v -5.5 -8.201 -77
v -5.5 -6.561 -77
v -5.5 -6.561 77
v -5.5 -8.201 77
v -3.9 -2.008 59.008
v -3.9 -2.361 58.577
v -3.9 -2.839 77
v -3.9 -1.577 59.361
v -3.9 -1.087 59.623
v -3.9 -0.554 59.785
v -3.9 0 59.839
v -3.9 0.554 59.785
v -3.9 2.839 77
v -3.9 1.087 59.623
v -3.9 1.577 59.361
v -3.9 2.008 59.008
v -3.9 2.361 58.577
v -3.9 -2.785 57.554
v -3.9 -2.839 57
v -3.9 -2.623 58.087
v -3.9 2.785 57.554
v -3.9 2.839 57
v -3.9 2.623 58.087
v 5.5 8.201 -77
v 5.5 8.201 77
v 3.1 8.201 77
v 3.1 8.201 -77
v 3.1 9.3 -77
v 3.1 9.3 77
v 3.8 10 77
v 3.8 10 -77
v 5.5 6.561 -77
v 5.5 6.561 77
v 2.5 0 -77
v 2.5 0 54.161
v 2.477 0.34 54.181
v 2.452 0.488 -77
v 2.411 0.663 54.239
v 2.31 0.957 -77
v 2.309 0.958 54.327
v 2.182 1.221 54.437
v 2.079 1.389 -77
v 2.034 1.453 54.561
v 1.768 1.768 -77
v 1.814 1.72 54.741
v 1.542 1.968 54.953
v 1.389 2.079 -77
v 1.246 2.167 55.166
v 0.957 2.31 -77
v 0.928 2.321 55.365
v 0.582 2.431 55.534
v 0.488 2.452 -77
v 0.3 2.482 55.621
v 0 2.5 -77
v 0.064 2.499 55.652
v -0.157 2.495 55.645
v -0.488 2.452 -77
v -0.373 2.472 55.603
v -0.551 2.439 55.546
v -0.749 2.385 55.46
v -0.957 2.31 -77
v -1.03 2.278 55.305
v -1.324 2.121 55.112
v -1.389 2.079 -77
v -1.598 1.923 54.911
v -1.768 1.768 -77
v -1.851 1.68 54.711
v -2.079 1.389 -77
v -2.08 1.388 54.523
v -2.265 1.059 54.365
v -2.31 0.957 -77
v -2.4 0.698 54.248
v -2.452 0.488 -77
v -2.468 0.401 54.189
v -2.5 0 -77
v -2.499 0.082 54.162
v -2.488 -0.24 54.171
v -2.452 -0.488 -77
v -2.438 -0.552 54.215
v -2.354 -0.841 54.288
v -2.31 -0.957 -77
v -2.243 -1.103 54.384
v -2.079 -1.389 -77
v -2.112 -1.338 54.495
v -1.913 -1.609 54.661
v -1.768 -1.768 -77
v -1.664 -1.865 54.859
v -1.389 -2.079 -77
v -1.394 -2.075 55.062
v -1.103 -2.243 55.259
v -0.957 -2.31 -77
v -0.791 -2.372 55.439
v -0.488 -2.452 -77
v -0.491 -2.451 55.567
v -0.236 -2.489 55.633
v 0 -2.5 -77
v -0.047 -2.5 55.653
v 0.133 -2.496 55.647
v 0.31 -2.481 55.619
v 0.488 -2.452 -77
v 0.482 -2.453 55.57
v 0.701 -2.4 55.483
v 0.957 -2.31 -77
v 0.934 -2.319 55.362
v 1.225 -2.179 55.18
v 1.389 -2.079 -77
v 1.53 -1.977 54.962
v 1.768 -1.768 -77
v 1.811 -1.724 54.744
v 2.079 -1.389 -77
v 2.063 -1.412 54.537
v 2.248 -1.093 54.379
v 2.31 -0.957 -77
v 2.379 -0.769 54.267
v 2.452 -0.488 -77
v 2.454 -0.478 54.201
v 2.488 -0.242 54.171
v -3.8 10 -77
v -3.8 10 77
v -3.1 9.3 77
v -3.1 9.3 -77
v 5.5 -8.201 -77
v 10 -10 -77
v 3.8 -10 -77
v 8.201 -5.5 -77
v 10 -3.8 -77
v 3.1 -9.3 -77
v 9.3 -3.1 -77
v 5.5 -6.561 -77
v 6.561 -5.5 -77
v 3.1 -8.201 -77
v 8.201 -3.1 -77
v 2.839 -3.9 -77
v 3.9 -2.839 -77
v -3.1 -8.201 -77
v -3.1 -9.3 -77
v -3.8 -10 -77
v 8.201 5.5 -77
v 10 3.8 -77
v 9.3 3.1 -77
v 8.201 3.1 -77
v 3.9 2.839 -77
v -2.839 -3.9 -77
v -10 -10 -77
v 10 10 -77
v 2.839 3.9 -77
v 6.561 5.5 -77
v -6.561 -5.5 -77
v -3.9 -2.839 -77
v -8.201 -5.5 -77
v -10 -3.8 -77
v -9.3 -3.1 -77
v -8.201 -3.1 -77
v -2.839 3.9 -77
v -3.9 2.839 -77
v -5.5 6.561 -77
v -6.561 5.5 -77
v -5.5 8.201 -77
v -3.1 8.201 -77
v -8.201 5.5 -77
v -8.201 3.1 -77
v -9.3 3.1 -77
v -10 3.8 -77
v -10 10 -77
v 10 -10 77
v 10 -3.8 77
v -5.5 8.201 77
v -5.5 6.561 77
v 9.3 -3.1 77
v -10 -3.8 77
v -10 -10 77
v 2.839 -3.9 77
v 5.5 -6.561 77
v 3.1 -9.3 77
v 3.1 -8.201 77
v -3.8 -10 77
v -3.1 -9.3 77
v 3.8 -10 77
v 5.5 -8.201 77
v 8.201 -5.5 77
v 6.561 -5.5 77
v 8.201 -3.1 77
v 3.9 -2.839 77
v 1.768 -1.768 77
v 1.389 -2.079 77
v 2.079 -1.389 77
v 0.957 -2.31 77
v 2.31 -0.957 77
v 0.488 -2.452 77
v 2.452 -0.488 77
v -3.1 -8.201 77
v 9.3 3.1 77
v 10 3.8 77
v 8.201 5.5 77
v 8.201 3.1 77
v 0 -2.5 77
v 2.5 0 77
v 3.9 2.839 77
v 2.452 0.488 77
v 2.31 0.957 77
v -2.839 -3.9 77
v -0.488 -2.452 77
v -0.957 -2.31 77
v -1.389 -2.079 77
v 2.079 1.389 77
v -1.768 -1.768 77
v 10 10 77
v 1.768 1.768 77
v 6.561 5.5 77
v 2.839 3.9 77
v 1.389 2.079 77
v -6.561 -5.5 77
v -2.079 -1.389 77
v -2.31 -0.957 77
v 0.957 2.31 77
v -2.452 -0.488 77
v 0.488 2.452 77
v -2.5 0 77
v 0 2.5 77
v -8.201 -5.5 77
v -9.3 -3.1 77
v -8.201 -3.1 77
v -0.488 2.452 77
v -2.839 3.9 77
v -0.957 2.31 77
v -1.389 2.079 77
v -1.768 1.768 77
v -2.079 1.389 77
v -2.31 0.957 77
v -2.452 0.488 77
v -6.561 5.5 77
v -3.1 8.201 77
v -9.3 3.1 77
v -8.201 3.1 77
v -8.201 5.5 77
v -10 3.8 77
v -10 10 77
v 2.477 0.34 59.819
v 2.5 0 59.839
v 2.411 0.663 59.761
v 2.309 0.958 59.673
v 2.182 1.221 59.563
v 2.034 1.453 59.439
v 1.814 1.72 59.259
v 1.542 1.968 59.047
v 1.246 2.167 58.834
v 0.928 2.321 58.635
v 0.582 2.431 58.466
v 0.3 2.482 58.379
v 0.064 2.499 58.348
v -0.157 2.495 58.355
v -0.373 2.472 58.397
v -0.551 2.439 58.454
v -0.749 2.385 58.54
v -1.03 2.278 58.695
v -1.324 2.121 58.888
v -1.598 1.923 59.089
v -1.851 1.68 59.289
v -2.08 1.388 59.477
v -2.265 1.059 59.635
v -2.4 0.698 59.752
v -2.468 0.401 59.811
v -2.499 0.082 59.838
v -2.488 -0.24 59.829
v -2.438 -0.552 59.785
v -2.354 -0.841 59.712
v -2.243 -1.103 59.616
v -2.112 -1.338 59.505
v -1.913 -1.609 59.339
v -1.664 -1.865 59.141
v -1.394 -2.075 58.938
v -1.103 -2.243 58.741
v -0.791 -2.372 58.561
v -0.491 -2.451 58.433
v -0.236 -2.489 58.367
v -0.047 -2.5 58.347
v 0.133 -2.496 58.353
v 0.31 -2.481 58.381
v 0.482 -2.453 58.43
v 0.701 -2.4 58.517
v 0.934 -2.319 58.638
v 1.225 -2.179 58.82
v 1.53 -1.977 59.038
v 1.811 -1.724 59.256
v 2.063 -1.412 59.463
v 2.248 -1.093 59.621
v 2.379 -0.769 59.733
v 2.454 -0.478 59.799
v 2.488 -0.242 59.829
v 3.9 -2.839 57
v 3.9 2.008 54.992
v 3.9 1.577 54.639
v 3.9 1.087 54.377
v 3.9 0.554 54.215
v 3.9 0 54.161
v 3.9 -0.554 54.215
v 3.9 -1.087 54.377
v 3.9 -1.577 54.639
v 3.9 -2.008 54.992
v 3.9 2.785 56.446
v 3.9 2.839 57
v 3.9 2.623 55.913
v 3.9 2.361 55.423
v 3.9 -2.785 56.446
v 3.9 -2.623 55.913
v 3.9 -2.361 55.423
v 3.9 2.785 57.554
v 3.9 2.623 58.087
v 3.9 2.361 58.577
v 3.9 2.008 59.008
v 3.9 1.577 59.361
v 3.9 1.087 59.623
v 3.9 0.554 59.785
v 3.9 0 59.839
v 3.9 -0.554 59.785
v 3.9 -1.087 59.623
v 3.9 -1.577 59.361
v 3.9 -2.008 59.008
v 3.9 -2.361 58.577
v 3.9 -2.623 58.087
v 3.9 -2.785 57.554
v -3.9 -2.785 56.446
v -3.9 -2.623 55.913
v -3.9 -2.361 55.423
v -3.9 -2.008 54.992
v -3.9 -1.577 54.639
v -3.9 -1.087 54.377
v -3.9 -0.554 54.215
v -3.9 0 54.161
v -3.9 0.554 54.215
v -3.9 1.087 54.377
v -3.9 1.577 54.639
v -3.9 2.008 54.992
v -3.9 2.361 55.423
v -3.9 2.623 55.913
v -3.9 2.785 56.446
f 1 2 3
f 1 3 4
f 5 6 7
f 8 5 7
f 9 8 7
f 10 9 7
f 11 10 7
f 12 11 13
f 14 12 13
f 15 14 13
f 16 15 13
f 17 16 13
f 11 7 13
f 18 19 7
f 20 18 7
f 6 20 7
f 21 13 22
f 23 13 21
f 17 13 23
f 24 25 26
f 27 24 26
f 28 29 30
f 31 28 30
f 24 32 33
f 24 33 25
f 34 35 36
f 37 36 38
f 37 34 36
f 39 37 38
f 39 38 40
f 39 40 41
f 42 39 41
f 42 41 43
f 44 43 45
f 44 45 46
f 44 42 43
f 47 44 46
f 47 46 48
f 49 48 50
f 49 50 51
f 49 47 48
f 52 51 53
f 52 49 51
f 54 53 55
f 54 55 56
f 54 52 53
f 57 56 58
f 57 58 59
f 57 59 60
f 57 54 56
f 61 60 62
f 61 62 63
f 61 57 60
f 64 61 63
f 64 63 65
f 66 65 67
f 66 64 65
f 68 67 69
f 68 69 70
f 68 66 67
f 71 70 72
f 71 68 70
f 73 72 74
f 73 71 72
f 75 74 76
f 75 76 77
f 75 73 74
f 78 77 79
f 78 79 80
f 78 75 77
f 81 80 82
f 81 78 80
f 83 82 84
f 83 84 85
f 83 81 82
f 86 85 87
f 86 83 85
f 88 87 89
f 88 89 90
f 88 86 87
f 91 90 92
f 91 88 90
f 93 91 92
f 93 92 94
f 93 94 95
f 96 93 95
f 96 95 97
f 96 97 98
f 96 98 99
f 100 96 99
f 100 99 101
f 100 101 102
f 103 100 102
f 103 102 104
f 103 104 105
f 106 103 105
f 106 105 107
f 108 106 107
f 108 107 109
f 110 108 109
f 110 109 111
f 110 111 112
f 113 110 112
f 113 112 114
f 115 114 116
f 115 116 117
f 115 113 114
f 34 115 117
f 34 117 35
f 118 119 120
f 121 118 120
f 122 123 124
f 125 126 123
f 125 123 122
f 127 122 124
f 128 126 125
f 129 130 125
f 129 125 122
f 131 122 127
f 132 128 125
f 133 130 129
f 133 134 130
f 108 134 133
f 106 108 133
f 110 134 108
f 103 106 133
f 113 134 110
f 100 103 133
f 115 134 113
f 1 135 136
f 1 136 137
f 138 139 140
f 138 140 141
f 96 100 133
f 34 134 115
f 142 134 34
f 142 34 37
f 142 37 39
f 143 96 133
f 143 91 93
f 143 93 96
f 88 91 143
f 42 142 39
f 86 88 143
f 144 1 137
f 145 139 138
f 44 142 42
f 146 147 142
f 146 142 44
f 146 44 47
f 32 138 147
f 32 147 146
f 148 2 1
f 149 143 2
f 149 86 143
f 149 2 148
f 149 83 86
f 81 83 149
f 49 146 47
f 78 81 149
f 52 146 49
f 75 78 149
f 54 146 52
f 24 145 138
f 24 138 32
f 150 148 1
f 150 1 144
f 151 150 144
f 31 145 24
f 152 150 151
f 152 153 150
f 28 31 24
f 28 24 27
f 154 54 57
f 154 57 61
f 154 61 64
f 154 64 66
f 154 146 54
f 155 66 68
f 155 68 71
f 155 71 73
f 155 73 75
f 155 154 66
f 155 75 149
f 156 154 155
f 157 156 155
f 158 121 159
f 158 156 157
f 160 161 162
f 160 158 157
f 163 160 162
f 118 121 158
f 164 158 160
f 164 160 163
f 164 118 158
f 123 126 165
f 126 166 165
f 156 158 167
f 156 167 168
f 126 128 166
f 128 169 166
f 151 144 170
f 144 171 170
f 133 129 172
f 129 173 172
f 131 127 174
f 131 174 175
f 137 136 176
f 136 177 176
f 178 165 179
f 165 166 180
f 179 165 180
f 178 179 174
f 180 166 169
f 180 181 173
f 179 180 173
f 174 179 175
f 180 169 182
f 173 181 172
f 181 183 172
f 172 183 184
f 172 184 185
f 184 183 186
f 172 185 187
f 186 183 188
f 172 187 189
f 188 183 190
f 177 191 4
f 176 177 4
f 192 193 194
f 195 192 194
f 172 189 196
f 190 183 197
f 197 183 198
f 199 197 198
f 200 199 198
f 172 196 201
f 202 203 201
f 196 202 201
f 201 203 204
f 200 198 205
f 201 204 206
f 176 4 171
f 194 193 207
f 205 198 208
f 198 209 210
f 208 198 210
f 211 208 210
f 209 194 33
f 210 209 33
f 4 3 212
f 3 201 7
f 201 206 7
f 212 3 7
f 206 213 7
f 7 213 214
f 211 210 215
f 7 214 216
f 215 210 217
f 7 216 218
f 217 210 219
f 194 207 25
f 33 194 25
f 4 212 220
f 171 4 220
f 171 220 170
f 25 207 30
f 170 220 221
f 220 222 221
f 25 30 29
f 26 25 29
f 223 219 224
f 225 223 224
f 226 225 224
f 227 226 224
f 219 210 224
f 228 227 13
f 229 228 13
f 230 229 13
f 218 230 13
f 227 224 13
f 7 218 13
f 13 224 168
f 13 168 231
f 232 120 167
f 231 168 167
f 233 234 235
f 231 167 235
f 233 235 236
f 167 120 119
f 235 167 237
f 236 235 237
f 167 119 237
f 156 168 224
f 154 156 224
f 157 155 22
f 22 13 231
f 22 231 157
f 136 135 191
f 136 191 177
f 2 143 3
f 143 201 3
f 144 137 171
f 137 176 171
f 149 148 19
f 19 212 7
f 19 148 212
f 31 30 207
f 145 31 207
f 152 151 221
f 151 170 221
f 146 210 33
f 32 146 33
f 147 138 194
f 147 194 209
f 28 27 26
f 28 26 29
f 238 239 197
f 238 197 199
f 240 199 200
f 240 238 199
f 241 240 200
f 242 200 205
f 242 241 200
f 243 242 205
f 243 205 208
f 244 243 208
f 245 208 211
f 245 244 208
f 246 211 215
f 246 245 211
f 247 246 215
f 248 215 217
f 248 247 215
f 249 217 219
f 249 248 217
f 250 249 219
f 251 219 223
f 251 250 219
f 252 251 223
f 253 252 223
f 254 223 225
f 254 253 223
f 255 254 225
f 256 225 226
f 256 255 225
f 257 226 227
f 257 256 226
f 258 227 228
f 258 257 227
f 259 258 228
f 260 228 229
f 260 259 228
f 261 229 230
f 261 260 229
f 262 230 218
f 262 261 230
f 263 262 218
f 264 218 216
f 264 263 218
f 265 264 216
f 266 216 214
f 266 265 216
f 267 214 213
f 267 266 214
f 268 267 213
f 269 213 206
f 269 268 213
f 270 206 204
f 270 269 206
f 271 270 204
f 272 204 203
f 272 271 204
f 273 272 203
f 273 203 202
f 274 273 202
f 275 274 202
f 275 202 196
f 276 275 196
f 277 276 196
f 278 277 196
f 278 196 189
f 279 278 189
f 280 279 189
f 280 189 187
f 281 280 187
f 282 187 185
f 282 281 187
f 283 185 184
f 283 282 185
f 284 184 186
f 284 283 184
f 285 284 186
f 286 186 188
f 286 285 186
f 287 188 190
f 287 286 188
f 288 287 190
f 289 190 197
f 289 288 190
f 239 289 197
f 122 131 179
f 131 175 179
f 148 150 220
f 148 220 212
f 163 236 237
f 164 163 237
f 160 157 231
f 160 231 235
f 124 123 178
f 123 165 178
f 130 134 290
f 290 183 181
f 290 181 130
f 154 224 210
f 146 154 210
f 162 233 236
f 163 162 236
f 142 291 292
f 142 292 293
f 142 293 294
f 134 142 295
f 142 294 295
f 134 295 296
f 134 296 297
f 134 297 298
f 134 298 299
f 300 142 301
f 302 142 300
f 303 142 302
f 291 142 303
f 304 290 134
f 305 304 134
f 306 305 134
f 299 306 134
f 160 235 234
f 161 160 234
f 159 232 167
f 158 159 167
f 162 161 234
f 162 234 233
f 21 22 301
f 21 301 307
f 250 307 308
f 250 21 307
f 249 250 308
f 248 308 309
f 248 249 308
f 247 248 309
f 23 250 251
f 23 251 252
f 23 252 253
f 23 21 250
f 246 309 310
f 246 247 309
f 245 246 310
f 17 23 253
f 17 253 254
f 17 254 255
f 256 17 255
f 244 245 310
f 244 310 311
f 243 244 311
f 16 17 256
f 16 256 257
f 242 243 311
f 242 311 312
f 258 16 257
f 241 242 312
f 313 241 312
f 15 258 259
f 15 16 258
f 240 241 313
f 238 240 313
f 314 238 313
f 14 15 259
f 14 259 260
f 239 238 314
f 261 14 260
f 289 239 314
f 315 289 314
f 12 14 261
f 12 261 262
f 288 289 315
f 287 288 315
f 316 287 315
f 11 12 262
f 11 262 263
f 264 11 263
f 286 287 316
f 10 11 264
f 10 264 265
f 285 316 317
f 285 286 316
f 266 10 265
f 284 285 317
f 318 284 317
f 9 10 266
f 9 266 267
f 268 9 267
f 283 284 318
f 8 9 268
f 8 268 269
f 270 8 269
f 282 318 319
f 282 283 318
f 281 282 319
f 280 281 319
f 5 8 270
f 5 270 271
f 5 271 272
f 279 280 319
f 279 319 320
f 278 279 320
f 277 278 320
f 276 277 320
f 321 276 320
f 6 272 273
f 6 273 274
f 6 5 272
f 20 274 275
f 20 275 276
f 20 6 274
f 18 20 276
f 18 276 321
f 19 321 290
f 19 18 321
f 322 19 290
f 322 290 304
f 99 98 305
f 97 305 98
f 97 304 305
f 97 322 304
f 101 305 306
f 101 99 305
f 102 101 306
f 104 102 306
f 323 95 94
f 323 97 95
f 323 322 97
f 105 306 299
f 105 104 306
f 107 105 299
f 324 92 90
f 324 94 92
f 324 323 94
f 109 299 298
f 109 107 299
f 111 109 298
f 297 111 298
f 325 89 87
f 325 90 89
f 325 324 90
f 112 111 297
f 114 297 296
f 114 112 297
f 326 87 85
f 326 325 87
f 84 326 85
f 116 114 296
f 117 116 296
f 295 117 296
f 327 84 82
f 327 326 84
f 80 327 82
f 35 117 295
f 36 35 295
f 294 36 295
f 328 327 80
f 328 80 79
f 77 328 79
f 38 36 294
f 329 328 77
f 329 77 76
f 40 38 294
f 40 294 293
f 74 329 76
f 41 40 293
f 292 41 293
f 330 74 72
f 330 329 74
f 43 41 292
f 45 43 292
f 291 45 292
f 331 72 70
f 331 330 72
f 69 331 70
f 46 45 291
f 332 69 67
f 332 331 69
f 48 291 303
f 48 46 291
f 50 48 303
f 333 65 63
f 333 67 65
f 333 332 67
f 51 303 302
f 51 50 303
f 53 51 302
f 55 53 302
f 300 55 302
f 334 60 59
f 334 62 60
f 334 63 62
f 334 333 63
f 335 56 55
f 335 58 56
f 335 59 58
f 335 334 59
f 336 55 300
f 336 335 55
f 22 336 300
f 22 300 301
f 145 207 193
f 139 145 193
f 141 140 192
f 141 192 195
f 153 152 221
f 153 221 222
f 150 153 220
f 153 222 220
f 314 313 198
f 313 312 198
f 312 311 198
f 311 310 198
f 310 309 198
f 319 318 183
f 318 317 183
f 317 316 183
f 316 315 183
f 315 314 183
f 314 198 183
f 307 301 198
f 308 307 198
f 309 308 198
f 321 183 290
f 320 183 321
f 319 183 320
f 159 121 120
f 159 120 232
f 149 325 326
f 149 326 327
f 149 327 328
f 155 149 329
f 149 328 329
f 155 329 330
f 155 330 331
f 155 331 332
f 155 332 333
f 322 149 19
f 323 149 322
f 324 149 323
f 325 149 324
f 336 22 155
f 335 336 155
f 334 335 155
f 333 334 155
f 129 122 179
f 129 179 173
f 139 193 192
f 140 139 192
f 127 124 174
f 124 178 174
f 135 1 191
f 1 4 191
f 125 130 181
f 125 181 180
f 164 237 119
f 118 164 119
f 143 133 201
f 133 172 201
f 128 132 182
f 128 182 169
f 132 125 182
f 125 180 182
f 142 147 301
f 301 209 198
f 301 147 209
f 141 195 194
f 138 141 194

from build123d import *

# Parameters (mm, degrees)
SKETCH1_R               = 2.5
BOSS_EXTRUDE1_DEPTH     = 77
CUT_EXTRUDE1_DEPTH      = 79.880986302
CUT_EXTRUDE1_DEPTH_BACK = 79.880986302
SKETCH2_R               = 2.839339828


with BuildPart() as part:
    # Sketch1 → Boss-Extrude1 (new, symmetric)
    with BuildSketch(Plane.XY):
        Polygon((3.9, -2.839339828), (6.560660172, -5.5), (8.200660172, -5.5), (8.200660172, -3.1), (9.3, -3.1), (10, -3.8), (10, -10), (3.8, -10), (3.1, -9.3), (3.1, -8.200660172), (5.5, -8.200660172), (5.5, -6.560660172), (2.839339828, -3.9), (-2.839339828, -3.9), (-5.5, -6.560660172), (-5.5, -8.200660172), (-3.1, -8.200660172), (-3.1, -9.3), (-3.8, -10), (-10, -10), (-10, -3.8), (-9.3, -3.1), (-8.200660172, -3.1), (-8.200660172, -5.5), (-6.560660172, -5.5), (-3.9, -2.839339828), (-3.9, 2.839339828), (-6.560660172, 5.5), (-8.200660172, 5.5), (-8.200660172, 3.1), (-9.3, 3.1), (-10, 3.8), (-10, 10), (-3.8, 10), (-3.1, 9.3), (-3.1, 8.200660172), (-5.5, 8.200660172), (-5.5, 6.560660172), (-2.839339828, 3.9), (2.839339828, 3.9), (5.5, 6.560660172), (5.5, 8.200660172), (3.1, 8.200660172), (3.1, 9.3), (3.8, 10), (10, 10), (10, 3.8), (9.3, 3.1), (8.200660172, 3.1), (8.200660172, 5.5), (6.560660172, 5.5), (3.9, 2.839339828), align=None)
        Circle(SKETCH1_R, mode=Mode.SUBTRACT)
    extrude(amount=BOSS_EXTRUDE1_DEPTH, both=True)

    # Sketch2 → Cut-Extrude1 (cut, two sides: drawn at the far end of the back side and taken through both)
    with BuildSketch(Plane(origin=(3.9, 0, 0), x_dir=(0, 0, -1), z_dir=(1, 0, 0)).offset(-CUT_EXTRUDE1_DEPTH_BACK)):
        with Locations(Location((-57, 0, 0), (0, 0, 90))):
            Circle(SKETCH2_R)
    extrude(amount=CUT_EXTRUDE1_DEPTH + CUT_EXTRUDE1_DEPTH_BACK, mode=Mode.SUBTRACT)


solid = part.part
